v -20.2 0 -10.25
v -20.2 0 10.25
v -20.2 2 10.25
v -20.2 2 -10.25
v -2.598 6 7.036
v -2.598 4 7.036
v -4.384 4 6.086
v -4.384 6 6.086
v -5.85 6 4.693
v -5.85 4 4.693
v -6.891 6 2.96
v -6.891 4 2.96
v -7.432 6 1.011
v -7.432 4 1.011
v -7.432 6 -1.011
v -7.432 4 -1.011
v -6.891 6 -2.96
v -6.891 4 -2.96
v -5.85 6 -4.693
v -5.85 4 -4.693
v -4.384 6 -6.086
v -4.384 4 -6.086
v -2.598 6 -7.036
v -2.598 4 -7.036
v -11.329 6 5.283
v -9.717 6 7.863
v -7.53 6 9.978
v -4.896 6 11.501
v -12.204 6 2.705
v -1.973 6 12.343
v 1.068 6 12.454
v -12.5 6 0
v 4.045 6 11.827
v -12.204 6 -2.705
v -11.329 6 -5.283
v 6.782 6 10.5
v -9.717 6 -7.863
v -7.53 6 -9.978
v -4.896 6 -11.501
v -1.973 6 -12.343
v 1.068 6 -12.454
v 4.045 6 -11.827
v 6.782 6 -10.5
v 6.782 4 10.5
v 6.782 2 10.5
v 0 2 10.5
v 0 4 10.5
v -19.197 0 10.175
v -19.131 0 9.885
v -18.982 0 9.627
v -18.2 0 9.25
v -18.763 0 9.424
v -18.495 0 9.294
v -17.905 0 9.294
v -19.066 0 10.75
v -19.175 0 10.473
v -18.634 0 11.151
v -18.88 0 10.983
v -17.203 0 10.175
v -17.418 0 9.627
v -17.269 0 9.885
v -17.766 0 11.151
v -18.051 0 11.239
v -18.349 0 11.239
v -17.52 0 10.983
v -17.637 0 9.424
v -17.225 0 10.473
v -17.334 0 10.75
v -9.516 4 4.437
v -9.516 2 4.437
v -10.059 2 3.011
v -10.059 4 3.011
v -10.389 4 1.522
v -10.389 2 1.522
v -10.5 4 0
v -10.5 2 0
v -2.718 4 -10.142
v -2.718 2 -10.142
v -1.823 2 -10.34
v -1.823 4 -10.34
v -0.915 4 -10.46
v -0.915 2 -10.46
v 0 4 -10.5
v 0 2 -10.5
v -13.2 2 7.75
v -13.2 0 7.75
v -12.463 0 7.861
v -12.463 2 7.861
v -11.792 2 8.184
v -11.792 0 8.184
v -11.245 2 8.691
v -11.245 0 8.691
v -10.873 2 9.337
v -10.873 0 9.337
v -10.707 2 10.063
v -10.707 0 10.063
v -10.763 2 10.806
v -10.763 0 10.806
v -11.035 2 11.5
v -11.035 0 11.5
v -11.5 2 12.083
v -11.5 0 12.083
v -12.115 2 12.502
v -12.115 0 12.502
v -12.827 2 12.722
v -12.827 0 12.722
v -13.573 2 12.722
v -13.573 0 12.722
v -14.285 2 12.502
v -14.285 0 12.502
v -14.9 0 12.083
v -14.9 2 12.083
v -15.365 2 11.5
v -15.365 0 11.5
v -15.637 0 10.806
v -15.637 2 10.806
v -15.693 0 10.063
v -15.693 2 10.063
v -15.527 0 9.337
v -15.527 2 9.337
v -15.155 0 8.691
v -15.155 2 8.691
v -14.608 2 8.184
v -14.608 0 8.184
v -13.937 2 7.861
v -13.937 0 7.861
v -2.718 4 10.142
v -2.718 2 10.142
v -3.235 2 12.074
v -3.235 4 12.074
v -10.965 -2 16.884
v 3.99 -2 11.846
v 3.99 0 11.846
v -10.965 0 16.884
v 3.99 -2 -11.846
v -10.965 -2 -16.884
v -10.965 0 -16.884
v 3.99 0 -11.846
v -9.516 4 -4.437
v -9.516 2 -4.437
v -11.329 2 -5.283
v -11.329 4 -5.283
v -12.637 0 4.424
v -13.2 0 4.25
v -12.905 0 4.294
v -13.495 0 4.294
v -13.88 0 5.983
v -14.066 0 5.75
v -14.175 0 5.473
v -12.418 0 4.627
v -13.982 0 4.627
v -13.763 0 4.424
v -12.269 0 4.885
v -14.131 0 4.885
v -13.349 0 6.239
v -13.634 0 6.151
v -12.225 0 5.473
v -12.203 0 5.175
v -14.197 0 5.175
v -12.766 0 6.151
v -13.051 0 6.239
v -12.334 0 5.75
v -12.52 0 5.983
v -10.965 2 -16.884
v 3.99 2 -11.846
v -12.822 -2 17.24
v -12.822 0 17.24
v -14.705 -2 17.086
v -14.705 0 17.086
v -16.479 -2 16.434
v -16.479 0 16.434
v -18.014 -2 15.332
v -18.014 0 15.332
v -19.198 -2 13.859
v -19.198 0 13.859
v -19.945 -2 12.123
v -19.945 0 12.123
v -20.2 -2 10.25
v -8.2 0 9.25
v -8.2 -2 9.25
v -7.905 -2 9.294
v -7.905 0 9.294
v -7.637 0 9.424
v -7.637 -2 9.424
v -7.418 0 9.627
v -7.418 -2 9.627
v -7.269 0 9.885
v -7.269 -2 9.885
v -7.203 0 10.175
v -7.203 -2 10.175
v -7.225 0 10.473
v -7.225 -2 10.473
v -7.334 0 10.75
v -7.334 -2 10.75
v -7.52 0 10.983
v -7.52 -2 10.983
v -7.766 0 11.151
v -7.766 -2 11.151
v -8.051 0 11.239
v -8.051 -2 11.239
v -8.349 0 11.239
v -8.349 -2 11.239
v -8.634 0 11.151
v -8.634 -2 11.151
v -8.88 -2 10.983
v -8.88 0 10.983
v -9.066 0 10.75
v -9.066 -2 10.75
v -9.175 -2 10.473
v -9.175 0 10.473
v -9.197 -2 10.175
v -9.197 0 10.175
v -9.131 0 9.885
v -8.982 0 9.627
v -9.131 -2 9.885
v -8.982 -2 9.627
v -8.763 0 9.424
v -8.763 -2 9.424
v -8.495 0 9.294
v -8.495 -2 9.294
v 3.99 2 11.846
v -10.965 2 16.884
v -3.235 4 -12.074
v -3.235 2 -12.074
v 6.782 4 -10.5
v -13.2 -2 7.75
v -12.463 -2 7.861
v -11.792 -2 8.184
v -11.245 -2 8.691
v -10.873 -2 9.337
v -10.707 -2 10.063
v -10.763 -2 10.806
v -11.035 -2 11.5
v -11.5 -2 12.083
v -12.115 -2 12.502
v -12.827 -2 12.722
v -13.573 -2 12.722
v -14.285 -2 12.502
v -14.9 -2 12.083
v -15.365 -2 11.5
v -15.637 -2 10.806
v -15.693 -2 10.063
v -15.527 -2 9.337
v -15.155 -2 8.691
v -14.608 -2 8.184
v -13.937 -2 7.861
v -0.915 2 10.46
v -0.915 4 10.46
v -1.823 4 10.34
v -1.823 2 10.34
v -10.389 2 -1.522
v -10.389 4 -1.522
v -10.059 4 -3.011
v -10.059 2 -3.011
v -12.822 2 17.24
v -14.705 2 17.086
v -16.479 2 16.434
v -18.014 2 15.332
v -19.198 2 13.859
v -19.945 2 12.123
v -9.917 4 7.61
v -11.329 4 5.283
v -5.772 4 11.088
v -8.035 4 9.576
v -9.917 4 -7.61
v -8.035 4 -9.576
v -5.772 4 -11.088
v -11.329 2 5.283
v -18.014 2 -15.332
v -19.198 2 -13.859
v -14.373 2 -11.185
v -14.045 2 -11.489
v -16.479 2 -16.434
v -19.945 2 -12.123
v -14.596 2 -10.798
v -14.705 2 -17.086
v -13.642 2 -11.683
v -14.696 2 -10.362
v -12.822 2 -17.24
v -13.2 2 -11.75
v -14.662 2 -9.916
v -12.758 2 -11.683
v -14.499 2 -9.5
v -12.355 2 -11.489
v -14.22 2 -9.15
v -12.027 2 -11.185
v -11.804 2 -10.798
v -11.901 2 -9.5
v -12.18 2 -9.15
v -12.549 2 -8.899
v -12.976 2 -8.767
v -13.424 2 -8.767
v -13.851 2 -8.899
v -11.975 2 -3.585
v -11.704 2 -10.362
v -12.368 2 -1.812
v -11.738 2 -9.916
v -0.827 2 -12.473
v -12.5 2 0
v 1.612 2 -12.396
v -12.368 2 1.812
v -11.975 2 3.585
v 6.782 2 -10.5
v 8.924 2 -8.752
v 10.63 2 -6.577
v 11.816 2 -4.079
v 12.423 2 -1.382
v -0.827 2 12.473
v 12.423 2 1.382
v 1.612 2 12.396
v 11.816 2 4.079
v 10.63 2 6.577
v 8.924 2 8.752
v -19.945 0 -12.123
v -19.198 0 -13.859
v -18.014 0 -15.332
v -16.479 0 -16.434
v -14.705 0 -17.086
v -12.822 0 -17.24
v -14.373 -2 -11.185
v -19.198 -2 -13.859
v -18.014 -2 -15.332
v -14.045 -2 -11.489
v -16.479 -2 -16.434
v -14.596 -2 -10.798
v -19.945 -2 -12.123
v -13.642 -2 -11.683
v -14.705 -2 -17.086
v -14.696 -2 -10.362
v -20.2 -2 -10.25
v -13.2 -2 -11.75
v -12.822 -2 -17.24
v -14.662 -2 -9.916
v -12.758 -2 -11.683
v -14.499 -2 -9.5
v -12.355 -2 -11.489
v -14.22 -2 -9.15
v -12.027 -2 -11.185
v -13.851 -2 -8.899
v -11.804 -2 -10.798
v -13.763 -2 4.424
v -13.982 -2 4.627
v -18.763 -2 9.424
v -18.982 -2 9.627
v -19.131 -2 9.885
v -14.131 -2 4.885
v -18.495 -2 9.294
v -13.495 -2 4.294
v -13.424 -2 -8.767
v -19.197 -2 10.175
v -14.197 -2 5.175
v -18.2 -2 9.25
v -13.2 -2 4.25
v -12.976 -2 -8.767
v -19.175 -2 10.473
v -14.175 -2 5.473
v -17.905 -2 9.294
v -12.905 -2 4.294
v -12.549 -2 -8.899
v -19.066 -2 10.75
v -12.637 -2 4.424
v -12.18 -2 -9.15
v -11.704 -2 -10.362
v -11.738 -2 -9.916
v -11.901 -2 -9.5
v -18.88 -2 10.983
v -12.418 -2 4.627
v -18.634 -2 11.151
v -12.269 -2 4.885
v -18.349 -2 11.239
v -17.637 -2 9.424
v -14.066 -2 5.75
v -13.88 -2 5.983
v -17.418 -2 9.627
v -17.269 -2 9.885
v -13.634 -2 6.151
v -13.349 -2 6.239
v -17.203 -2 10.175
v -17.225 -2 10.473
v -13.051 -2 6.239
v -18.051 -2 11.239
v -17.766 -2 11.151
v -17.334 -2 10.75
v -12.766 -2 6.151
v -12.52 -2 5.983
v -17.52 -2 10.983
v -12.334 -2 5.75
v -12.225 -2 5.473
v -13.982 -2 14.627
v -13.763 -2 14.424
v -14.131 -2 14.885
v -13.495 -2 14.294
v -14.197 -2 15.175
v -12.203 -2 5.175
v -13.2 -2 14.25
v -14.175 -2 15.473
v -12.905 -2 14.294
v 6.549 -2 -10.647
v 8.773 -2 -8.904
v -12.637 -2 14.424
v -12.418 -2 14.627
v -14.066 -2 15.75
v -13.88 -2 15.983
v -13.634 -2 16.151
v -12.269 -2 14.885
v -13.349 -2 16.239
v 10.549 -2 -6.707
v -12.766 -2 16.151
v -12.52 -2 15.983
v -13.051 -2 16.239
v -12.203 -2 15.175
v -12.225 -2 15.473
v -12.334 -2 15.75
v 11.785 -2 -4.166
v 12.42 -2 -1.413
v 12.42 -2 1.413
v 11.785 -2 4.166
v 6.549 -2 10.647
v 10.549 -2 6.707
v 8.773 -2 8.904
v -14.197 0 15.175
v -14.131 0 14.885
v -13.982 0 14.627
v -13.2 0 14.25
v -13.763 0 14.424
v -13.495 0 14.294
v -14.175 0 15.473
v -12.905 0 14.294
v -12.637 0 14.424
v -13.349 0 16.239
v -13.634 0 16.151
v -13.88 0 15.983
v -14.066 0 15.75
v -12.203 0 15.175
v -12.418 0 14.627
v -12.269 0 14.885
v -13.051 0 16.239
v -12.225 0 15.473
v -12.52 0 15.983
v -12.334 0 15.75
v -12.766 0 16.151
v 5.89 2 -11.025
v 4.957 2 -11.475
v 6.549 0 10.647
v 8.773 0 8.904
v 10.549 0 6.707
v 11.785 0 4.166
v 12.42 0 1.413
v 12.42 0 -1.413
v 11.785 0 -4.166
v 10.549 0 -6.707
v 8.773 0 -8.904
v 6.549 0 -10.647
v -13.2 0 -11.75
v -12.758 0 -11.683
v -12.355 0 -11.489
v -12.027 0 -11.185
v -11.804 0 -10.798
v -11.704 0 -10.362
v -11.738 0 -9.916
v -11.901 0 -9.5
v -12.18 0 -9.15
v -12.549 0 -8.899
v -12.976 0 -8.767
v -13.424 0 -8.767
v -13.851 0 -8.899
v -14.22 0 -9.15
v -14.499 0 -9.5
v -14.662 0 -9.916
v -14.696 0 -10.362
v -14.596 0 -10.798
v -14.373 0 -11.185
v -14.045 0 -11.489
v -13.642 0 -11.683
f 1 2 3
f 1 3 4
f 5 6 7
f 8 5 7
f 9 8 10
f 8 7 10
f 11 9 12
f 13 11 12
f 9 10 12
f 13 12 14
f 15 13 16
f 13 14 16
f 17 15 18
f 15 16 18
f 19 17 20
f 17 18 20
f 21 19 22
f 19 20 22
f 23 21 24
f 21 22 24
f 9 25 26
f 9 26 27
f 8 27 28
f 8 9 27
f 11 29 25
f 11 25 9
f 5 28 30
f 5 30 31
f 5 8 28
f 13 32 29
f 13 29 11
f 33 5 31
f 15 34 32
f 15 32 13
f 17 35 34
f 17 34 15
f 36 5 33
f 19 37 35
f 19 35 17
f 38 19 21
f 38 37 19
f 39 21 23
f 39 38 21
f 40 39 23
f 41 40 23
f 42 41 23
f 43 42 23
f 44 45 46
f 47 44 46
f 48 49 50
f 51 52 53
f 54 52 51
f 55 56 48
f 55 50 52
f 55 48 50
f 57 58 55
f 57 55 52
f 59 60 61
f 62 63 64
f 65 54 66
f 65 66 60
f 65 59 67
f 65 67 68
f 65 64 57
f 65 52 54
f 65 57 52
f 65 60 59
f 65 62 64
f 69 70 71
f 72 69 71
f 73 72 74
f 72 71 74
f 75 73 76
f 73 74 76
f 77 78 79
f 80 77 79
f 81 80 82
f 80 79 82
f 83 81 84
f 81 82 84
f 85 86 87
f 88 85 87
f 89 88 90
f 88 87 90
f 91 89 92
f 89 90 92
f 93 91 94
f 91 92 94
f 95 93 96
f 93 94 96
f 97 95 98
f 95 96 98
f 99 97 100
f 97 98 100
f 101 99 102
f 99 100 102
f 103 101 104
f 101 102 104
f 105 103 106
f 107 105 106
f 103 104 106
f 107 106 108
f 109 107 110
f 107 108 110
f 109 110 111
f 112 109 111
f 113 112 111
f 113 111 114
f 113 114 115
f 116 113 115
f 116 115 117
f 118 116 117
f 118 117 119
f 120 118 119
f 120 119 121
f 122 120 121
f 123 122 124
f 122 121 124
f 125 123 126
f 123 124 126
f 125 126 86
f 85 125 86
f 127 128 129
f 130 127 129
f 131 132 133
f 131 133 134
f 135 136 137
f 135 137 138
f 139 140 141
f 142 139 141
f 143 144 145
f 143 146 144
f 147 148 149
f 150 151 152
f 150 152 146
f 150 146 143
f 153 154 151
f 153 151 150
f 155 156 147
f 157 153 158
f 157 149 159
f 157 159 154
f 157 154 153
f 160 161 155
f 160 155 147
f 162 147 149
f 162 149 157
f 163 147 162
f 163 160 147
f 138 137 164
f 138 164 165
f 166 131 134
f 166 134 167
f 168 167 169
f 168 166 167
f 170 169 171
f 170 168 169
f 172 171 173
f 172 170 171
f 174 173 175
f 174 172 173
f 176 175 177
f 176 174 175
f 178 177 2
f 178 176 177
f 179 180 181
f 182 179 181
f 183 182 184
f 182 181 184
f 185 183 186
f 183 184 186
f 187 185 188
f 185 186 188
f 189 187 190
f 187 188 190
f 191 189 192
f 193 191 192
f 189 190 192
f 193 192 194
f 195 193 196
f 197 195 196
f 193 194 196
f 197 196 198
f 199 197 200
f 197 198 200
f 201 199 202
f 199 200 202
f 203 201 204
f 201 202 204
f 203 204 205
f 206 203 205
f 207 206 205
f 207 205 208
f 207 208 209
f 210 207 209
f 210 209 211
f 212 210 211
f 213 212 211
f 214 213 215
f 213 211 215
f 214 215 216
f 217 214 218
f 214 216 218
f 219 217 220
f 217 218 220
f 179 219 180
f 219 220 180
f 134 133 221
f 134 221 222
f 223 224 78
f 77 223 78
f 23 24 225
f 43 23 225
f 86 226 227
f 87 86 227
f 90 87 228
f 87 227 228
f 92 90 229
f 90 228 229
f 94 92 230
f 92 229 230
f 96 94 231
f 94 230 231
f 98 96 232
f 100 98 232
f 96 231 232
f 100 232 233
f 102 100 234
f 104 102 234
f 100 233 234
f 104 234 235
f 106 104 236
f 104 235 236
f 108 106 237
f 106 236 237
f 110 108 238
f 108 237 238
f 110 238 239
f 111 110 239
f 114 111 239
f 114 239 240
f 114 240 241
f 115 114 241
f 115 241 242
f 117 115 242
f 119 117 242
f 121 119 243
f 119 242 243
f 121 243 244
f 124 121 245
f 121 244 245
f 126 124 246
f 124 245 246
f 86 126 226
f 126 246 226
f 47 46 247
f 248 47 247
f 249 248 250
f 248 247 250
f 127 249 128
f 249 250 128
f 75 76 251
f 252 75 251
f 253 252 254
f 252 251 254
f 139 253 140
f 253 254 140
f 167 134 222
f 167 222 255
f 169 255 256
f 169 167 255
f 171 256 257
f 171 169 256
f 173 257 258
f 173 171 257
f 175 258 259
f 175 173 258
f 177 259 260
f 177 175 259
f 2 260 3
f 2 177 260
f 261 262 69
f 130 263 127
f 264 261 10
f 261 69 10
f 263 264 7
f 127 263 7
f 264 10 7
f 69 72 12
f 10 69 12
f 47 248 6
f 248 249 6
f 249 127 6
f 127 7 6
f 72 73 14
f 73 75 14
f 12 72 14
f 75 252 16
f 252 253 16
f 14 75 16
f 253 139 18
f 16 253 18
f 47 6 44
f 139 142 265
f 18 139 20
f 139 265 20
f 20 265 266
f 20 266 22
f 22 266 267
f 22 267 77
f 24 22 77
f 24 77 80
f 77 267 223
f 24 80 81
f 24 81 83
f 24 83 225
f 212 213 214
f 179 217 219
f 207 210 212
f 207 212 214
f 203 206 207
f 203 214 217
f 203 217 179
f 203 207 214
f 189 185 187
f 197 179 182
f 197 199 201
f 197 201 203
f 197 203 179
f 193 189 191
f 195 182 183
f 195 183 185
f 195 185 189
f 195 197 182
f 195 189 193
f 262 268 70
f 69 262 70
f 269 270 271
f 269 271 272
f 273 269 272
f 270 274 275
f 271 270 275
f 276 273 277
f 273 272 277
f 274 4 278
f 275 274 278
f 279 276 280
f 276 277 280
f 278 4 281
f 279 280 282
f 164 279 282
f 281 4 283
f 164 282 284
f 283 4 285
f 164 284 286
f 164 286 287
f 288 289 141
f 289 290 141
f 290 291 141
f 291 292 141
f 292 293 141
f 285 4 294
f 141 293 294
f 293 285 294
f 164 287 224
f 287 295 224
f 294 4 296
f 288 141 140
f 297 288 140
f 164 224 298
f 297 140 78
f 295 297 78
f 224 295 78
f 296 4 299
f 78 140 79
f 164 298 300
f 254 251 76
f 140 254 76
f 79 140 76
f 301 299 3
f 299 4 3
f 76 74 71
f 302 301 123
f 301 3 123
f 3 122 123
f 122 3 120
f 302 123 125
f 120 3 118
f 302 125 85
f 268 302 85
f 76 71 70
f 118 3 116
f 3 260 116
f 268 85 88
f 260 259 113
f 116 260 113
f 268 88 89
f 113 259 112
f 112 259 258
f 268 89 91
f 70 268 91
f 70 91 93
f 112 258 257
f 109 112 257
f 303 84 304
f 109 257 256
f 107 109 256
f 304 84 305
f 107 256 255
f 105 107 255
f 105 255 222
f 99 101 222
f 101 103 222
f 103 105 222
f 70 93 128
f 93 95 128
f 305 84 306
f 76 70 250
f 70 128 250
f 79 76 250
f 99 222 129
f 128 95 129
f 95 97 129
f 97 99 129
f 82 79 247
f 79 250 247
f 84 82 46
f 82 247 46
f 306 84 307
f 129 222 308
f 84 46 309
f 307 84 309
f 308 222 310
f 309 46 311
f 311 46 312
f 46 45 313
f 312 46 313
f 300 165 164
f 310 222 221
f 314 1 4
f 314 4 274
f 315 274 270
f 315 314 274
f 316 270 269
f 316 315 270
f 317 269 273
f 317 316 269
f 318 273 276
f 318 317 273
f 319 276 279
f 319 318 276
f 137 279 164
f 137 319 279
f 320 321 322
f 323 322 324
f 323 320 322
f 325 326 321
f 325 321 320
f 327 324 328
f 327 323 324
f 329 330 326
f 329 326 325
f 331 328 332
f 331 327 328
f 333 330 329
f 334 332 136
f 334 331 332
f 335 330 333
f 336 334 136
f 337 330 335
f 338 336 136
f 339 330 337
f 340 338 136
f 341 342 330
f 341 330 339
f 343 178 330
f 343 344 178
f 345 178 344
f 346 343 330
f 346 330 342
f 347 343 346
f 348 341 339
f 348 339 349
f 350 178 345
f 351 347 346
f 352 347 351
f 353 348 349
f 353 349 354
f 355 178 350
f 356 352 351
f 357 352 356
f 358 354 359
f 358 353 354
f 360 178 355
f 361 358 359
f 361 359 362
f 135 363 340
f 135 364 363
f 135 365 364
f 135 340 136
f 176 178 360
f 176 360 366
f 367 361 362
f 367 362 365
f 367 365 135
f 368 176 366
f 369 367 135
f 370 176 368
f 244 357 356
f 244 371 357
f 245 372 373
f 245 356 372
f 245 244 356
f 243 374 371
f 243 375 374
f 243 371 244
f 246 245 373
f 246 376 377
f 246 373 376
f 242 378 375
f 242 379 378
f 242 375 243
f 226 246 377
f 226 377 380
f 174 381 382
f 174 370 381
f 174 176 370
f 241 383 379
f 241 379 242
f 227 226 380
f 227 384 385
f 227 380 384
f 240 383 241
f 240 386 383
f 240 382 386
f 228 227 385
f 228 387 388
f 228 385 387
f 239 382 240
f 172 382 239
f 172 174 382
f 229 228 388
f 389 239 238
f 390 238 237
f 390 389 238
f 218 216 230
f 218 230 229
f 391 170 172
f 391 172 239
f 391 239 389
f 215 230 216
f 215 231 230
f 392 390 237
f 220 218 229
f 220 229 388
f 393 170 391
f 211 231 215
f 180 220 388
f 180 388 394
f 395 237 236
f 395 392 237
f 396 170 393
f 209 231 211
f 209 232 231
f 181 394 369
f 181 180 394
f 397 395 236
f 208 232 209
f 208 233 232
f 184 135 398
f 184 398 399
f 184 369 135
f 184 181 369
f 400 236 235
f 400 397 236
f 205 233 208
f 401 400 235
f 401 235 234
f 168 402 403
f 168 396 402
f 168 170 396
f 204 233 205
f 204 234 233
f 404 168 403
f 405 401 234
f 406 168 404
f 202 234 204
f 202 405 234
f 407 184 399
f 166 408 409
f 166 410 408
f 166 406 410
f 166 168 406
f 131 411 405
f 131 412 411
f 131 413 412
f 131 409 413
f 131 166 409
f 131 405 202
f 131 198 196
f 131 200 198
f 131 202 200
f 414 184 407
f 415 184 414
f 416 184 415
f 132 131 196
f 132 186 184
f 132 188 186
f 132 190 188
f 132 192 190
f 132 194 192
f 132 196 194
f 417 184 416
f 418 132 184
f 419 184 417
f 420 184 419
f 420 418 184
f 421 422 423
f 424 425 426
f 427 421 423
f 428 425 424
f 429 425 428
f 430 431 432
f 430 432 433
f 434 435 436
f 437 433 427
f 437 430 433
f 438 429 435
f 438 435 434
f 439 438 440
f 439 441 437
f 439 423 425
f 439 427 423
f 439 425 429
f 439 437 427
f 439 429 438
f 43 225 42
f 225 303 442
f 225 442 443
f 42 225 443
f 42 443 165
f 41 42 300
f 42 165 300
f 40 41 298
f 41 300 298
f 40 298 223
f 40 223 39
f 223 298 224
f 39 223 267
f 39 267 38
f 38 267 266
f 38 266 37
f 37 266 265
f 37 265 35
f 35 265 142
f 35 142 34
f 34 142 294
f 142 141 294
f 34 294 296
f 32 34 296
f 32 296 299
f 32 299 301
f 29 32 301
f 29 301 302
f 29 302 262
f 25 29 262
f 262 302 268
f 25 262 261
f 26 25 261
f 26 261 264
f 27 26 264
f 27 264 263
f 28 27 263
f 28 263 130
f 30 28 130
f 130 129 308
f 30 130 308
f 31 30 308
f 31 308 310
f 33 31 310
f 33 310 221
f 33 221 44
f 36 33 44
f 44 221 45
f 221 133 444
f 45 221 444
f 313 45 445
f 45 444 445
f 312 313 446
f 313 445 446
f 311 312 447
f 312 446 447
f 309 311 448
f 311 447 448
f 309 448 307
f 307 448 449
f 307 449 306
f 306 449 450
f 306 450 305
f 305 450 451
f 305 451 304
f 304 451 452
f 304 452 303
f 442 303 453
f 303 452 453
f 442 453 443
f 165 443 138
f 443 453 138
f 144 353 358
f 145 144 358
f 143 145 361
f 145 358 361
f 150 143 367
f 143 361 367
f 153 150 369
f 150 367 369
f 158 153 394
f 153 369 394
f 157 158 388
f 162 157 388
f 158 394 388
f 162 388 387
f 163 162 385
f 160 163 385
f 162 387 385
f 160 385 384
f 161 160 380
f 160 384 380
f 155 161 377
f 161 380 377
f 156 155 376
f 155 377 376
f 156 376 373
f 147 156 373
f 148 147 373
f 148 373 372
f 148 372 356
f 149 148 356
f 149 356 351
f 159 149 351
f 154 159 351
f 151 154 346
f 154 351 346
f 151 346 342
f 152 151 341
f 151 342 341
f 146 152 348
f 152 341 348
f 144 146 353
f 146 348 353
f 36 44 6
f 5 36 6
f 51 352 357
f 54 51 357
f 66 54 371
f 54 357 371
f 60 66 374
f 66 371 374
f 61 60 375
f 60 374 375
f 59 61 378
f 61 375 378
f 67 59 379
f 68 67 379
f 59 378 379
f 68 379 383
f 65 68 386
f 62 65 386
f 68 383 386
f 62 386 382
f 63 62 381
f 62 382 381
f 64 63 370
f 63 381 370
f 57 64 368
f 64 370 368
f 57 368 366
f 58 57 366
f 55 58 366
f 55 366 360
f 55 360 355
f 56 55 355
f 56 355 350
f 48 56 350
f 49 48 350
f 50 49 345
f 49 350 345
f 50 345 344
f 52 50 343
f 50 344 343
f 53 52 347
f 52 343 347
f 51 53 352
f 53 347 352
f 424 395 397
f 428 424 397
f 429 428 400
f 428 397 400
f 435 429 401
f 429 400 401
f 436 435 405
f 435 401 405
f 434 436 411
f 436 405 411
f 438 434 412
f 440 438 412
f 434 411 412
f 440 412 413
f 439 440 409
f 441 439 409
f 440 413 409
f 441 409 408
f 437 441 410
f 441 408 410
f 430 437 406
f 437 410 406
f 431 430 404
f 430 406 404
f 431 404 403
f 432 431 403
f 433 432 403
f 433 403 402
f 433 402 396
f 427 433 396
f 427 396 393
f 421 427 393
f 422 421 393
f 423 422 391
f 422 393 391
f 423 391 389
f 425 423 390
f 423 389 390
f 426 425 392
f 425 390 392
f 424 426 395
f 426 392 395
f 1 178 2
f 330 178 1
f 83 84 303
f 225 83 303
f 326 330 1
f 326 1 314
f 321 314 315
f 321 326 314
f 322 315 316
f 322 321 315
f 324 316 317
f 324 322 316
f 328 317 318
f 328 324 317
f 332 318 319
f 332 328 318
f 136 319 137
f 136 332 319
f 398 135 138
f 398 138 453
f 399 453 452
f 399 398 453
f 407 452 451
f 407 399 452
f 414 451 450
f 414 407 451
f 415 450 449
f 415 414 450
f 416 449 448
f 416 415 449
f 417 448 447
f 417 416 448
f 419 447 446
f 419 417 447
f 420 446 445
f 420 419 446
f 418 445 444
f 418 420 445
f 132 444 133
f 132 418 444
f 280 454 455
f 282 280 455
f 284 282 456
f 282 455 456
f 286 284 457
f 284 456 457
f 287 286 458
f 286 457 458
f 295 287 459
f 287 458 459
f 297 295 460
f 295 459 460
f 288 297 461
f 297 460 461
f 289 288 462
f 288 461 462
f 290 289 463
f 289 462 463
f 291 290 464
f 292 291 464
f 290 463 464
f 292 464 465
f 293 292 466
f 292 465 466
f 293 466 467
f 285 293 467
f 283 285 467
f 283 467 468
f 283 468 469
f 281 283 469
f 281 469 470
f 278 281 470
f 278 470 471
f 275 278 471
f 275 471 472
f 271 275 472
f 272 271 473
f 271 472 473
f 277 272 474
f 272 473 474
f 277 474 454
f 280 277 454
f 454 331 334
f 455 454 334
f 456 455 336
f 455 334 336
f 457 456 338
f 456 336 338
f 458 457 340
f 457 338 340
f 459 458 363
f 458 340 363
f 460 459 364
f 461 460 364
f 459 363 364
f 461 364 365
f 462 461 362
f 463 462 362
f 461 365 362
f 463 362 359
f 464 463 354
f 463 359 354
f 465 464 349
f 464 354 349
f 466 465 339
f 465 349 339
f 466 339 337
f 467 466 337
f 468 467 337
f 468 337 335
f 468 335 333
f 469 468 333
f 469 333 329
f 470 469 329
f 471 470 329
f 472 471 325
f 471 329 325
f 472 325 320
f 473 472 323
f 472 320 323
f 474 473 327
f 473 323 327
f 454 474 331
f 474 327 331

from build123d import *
from build123d.topology import SkipClean

# Parameters (mm, degrees)
SKETCH_1_R      = 12.5
EXTRUDE_1_DEPTH = 2
EXTRUDE_2_DEPTH = 2
EXTRUDE_3_DEPTH = 2
SKETCH_5_R      = 2.5
SKETCH_5_R_2    = 1.5
EXTRUDE_4_DEPTH = 2
EXTRUDE_START   = 2
SKETCH_6_R      = 1.5
SKETCH_6_R_2    = 1
SKETCH_6_R_3    = 2.5
EXTRUDE_5_DEPTH = 2


with BuildPart() as part:
    # Эскиз1 → Бобышка-Вытянуть1 (new body)
    with BuildSketch(Plane(origin=(0, 0, 0), x_dir=(1, 0, 0), z_dir=(0, 1, 0))):
        with Locations(Location((0, 0, 0), (0, 0, 270))):
            Circle(SKETCH_1_R)
    extrude(amount=EXTRUDE_1_DEPTH)

    # Эскиз2 → Бобышка-Вытянуть2 (add)
    with BuildSketch(Plane(origin=(0, 2, 0), x_dir=(1, 0, 0), z_dir=(0, 1, 0))):
        with BuildLine():
            ThreePointArc((-11.328847338, 5.282728272), (-12.203700089, 2.705495174), (-12.5, 0))
            Line((-12.5, 0), (-10.5, 0))
            ThreePointArc((-10.5, 0), (-10.251108075, 2.272615946), (-9.516231764, 4.437491748))
            Line((-9.516231764, 4.437491748), (-11.328847338, 5.282728272))
        make_face()
        with BuildLine():
            ThreePointArc((-12.5, 0), (-12.203700089, -2.705495174), (-11.328847338, -5.282728272))
            Line((-11.328847338, -5.282728272), (-9.516231764, -4.437491748))
            ThreePointArc((-9.516231764, -4.437491748), (-10.251108075, -2.272615946), (-10.5, 0))
            Line((-10.5, 0), (-12.5, 0))
        make_face()
        with BuildLine():
            Line((6.782329983, -10.5), (0, -10.5))
            ThreePointArc((0, -10.5), (-1.370525018, -10.410171044), (-2.717599974, -10.142221176))
            Line((-2.717599974, -10.142221176), (-3.235238064, -12.074072829))
            ThreePointArc((-3.235238064, -12.074072829), (1.940332855, -12.348486078), (6.782329983, -10.5))
        make_face()
        with BuildLine():
            Line((0, 10.5), (6.782329983, 10.5))
            ThreePointArc((6.782329983, 10.5), (1.940332855, 12.348486078), (-3.235238064, 12.074072829))
            Line((-3.235238064, 12.074072829), (-2.717599974, 10.142221176))
            ThreePointArc((-2.717599974, 10.142221176), (-1.370525018, 10.410171044), (0, 10.5))
        make_face()
    extrude(amount=EXTRUDE_2_DEPTH)

    # Эскиз4 → Бобышка-Вытянуть3 (add)
    with BuildSketch(Plane(origin=(0, 4, 0), x_dir=(1, 0, 0), z_dir=(0, 1, 0))):
        with BuildLine():
            ThreePointArc((-11.328847338, -5.282728272), (-3.460156945, -12.011549189), (6.782329983, -10.5))
            Line((6.782329983, -10.5), (-2.598361206, -7.035518392))
            ThreePointArc((-2.598361206, -7.035518392), (-7.5, 0), (-2.598361206, 7.035518392))
            Line((-2.598361206, 7.035518392), (6.782329983, 10.5))
            ThreePointArc((6.782329983, 10.5), (-3.460156945, 12.011549189), (-11.328847338, 5.282728272))
            Line((-11.328847338, 5.282728272), (-9.516231764, 4.437491748))
            ThreePointArc((-9.516231764, 4.437491748), (-10.5, 0), (-9.516231764, -4.437491748))
            Line((-9.516231764, -4.437491748), (-11.328847338, -5.282728272))
        make_face()
        with BuildLine():
            Line((-9.516231764, 4.437491748), (-11.328847338, 5.282728272))
            ThreePointArc((-11.328847338, 5.282728272), (-12.5, 0), (-11.328847338, -5.282728272))
            Line((-11.328847338, -5.282728272), (-9.516231764, -4.437491748))
            ThreePointArc((-9.516231764, -4.437491748), (-10.5, 0), (-9.516231764, 4.437491748))
        make_face()
    extrude(amount=EXTRUDE_3_DEPTH)

    # Эскиз5 → Бобышка-Вытянуть4 (add)
    with BuildSketch(Plane.XZ):
        with BuildLine():
            Line((-20.2, 10.25), (-20.2, -10.25))
            ThreePointArc((-20.2, -10.25), (-17.284002551, -15.935149353), (-10.965450526, -16.883761274))
            Line((-10.965450526, -16.883761274), (3.990266919, -11.846002276))
            ThreePointArc((3.990266919, -11.846002276), (12.5, 0), (3.990266919, 11.846002276))
            Line((3.990266919, 11.846002276), (-10.965450526, 16.883761274))
            ThreePointArc((-10.965450526, 16.883761274), (-17.284002551, 15.935149353), (-20.2, 10.25))
        make_face()
        with Locations(Location((-13.2, 10.25, 0), (0, 0, 270))):
            Circle(SKETCH_5_R, mode=Mode.SUBTRACT)
        with Locations(Location((-13.2, -10.25, 0), (0, 0, 270))):
            Circle(SKETCH_5_R_2, mode=Mode.SUBTRACT)
    extrude(amount=-EXTRUDE_4_DEPTH)

    # Эскиз6 → Бобышка-Вытянуть5 (add)
    with SkipClean():  # the faces are left unmerged after this step: merging them gives an invalid solid
        with BuildSketch(Plane.XZ.offset(EXTRUDE_START)):
            with BuildLine():
                Line((3.990266919, 11.846002276), (-10.965450526, 16.883761274))
                ThreePointArc((-10.965450526, 16.883761274), (-17.284002551, 15.935149353), (-20.2, 10.25))
                Line((-20.2, 10.25), (-20.2, -10.25))
                ThreePointArc((-20.2, -10.25), (-17.284002551, -15.935149353), (-10.965450526, -16.883761274))
                Line((-10.965450526, -16.883761274), (3.990266919, -11.846002276))
                ThreePointArc((3.990266919, -11.846002276), (12.5, 0), (3.990266919, 11.846002276))
            make_face()
            with Locations(Location((-13.2, -10.25, 0), (0, 0, 270))):
                Circle(SKETCH_6_R, mode=Mode.SUBTRACT)
            with Locations(Location((-8.2, 10.25, 0), (0, 0, 270))):
                Circle(SKETCH_6_R_2, mode=Mode.SUBTRACT)
            with Locations(Location((-13.2, 5.25, 0), (0, 0, 270))):
                Circle(SKETCH_6_R_2, mode=Mode.SUBTRACT)
            with Locations(Location((-18.2, 10.25, 0), (0, 0, 270))):
                Circle(SKETCH_6_R_2, mode=Mode.SUBTRACT)
            with Locations(Location((-13.2, 15.25, 0), (0, 0, 270))):
                Circle(SKETCH_6_R_2, mode=Mode.SUBTRACT)
            with Locations(Location((-13.2, 10.25, 0), (0, 0, 270))):
                Circle(SKETCH_6_R_3, mode=Mode.SUBTRACT)
        extrude(amount=-EXTRUDE_5_DEPTH)


solid = part.part
